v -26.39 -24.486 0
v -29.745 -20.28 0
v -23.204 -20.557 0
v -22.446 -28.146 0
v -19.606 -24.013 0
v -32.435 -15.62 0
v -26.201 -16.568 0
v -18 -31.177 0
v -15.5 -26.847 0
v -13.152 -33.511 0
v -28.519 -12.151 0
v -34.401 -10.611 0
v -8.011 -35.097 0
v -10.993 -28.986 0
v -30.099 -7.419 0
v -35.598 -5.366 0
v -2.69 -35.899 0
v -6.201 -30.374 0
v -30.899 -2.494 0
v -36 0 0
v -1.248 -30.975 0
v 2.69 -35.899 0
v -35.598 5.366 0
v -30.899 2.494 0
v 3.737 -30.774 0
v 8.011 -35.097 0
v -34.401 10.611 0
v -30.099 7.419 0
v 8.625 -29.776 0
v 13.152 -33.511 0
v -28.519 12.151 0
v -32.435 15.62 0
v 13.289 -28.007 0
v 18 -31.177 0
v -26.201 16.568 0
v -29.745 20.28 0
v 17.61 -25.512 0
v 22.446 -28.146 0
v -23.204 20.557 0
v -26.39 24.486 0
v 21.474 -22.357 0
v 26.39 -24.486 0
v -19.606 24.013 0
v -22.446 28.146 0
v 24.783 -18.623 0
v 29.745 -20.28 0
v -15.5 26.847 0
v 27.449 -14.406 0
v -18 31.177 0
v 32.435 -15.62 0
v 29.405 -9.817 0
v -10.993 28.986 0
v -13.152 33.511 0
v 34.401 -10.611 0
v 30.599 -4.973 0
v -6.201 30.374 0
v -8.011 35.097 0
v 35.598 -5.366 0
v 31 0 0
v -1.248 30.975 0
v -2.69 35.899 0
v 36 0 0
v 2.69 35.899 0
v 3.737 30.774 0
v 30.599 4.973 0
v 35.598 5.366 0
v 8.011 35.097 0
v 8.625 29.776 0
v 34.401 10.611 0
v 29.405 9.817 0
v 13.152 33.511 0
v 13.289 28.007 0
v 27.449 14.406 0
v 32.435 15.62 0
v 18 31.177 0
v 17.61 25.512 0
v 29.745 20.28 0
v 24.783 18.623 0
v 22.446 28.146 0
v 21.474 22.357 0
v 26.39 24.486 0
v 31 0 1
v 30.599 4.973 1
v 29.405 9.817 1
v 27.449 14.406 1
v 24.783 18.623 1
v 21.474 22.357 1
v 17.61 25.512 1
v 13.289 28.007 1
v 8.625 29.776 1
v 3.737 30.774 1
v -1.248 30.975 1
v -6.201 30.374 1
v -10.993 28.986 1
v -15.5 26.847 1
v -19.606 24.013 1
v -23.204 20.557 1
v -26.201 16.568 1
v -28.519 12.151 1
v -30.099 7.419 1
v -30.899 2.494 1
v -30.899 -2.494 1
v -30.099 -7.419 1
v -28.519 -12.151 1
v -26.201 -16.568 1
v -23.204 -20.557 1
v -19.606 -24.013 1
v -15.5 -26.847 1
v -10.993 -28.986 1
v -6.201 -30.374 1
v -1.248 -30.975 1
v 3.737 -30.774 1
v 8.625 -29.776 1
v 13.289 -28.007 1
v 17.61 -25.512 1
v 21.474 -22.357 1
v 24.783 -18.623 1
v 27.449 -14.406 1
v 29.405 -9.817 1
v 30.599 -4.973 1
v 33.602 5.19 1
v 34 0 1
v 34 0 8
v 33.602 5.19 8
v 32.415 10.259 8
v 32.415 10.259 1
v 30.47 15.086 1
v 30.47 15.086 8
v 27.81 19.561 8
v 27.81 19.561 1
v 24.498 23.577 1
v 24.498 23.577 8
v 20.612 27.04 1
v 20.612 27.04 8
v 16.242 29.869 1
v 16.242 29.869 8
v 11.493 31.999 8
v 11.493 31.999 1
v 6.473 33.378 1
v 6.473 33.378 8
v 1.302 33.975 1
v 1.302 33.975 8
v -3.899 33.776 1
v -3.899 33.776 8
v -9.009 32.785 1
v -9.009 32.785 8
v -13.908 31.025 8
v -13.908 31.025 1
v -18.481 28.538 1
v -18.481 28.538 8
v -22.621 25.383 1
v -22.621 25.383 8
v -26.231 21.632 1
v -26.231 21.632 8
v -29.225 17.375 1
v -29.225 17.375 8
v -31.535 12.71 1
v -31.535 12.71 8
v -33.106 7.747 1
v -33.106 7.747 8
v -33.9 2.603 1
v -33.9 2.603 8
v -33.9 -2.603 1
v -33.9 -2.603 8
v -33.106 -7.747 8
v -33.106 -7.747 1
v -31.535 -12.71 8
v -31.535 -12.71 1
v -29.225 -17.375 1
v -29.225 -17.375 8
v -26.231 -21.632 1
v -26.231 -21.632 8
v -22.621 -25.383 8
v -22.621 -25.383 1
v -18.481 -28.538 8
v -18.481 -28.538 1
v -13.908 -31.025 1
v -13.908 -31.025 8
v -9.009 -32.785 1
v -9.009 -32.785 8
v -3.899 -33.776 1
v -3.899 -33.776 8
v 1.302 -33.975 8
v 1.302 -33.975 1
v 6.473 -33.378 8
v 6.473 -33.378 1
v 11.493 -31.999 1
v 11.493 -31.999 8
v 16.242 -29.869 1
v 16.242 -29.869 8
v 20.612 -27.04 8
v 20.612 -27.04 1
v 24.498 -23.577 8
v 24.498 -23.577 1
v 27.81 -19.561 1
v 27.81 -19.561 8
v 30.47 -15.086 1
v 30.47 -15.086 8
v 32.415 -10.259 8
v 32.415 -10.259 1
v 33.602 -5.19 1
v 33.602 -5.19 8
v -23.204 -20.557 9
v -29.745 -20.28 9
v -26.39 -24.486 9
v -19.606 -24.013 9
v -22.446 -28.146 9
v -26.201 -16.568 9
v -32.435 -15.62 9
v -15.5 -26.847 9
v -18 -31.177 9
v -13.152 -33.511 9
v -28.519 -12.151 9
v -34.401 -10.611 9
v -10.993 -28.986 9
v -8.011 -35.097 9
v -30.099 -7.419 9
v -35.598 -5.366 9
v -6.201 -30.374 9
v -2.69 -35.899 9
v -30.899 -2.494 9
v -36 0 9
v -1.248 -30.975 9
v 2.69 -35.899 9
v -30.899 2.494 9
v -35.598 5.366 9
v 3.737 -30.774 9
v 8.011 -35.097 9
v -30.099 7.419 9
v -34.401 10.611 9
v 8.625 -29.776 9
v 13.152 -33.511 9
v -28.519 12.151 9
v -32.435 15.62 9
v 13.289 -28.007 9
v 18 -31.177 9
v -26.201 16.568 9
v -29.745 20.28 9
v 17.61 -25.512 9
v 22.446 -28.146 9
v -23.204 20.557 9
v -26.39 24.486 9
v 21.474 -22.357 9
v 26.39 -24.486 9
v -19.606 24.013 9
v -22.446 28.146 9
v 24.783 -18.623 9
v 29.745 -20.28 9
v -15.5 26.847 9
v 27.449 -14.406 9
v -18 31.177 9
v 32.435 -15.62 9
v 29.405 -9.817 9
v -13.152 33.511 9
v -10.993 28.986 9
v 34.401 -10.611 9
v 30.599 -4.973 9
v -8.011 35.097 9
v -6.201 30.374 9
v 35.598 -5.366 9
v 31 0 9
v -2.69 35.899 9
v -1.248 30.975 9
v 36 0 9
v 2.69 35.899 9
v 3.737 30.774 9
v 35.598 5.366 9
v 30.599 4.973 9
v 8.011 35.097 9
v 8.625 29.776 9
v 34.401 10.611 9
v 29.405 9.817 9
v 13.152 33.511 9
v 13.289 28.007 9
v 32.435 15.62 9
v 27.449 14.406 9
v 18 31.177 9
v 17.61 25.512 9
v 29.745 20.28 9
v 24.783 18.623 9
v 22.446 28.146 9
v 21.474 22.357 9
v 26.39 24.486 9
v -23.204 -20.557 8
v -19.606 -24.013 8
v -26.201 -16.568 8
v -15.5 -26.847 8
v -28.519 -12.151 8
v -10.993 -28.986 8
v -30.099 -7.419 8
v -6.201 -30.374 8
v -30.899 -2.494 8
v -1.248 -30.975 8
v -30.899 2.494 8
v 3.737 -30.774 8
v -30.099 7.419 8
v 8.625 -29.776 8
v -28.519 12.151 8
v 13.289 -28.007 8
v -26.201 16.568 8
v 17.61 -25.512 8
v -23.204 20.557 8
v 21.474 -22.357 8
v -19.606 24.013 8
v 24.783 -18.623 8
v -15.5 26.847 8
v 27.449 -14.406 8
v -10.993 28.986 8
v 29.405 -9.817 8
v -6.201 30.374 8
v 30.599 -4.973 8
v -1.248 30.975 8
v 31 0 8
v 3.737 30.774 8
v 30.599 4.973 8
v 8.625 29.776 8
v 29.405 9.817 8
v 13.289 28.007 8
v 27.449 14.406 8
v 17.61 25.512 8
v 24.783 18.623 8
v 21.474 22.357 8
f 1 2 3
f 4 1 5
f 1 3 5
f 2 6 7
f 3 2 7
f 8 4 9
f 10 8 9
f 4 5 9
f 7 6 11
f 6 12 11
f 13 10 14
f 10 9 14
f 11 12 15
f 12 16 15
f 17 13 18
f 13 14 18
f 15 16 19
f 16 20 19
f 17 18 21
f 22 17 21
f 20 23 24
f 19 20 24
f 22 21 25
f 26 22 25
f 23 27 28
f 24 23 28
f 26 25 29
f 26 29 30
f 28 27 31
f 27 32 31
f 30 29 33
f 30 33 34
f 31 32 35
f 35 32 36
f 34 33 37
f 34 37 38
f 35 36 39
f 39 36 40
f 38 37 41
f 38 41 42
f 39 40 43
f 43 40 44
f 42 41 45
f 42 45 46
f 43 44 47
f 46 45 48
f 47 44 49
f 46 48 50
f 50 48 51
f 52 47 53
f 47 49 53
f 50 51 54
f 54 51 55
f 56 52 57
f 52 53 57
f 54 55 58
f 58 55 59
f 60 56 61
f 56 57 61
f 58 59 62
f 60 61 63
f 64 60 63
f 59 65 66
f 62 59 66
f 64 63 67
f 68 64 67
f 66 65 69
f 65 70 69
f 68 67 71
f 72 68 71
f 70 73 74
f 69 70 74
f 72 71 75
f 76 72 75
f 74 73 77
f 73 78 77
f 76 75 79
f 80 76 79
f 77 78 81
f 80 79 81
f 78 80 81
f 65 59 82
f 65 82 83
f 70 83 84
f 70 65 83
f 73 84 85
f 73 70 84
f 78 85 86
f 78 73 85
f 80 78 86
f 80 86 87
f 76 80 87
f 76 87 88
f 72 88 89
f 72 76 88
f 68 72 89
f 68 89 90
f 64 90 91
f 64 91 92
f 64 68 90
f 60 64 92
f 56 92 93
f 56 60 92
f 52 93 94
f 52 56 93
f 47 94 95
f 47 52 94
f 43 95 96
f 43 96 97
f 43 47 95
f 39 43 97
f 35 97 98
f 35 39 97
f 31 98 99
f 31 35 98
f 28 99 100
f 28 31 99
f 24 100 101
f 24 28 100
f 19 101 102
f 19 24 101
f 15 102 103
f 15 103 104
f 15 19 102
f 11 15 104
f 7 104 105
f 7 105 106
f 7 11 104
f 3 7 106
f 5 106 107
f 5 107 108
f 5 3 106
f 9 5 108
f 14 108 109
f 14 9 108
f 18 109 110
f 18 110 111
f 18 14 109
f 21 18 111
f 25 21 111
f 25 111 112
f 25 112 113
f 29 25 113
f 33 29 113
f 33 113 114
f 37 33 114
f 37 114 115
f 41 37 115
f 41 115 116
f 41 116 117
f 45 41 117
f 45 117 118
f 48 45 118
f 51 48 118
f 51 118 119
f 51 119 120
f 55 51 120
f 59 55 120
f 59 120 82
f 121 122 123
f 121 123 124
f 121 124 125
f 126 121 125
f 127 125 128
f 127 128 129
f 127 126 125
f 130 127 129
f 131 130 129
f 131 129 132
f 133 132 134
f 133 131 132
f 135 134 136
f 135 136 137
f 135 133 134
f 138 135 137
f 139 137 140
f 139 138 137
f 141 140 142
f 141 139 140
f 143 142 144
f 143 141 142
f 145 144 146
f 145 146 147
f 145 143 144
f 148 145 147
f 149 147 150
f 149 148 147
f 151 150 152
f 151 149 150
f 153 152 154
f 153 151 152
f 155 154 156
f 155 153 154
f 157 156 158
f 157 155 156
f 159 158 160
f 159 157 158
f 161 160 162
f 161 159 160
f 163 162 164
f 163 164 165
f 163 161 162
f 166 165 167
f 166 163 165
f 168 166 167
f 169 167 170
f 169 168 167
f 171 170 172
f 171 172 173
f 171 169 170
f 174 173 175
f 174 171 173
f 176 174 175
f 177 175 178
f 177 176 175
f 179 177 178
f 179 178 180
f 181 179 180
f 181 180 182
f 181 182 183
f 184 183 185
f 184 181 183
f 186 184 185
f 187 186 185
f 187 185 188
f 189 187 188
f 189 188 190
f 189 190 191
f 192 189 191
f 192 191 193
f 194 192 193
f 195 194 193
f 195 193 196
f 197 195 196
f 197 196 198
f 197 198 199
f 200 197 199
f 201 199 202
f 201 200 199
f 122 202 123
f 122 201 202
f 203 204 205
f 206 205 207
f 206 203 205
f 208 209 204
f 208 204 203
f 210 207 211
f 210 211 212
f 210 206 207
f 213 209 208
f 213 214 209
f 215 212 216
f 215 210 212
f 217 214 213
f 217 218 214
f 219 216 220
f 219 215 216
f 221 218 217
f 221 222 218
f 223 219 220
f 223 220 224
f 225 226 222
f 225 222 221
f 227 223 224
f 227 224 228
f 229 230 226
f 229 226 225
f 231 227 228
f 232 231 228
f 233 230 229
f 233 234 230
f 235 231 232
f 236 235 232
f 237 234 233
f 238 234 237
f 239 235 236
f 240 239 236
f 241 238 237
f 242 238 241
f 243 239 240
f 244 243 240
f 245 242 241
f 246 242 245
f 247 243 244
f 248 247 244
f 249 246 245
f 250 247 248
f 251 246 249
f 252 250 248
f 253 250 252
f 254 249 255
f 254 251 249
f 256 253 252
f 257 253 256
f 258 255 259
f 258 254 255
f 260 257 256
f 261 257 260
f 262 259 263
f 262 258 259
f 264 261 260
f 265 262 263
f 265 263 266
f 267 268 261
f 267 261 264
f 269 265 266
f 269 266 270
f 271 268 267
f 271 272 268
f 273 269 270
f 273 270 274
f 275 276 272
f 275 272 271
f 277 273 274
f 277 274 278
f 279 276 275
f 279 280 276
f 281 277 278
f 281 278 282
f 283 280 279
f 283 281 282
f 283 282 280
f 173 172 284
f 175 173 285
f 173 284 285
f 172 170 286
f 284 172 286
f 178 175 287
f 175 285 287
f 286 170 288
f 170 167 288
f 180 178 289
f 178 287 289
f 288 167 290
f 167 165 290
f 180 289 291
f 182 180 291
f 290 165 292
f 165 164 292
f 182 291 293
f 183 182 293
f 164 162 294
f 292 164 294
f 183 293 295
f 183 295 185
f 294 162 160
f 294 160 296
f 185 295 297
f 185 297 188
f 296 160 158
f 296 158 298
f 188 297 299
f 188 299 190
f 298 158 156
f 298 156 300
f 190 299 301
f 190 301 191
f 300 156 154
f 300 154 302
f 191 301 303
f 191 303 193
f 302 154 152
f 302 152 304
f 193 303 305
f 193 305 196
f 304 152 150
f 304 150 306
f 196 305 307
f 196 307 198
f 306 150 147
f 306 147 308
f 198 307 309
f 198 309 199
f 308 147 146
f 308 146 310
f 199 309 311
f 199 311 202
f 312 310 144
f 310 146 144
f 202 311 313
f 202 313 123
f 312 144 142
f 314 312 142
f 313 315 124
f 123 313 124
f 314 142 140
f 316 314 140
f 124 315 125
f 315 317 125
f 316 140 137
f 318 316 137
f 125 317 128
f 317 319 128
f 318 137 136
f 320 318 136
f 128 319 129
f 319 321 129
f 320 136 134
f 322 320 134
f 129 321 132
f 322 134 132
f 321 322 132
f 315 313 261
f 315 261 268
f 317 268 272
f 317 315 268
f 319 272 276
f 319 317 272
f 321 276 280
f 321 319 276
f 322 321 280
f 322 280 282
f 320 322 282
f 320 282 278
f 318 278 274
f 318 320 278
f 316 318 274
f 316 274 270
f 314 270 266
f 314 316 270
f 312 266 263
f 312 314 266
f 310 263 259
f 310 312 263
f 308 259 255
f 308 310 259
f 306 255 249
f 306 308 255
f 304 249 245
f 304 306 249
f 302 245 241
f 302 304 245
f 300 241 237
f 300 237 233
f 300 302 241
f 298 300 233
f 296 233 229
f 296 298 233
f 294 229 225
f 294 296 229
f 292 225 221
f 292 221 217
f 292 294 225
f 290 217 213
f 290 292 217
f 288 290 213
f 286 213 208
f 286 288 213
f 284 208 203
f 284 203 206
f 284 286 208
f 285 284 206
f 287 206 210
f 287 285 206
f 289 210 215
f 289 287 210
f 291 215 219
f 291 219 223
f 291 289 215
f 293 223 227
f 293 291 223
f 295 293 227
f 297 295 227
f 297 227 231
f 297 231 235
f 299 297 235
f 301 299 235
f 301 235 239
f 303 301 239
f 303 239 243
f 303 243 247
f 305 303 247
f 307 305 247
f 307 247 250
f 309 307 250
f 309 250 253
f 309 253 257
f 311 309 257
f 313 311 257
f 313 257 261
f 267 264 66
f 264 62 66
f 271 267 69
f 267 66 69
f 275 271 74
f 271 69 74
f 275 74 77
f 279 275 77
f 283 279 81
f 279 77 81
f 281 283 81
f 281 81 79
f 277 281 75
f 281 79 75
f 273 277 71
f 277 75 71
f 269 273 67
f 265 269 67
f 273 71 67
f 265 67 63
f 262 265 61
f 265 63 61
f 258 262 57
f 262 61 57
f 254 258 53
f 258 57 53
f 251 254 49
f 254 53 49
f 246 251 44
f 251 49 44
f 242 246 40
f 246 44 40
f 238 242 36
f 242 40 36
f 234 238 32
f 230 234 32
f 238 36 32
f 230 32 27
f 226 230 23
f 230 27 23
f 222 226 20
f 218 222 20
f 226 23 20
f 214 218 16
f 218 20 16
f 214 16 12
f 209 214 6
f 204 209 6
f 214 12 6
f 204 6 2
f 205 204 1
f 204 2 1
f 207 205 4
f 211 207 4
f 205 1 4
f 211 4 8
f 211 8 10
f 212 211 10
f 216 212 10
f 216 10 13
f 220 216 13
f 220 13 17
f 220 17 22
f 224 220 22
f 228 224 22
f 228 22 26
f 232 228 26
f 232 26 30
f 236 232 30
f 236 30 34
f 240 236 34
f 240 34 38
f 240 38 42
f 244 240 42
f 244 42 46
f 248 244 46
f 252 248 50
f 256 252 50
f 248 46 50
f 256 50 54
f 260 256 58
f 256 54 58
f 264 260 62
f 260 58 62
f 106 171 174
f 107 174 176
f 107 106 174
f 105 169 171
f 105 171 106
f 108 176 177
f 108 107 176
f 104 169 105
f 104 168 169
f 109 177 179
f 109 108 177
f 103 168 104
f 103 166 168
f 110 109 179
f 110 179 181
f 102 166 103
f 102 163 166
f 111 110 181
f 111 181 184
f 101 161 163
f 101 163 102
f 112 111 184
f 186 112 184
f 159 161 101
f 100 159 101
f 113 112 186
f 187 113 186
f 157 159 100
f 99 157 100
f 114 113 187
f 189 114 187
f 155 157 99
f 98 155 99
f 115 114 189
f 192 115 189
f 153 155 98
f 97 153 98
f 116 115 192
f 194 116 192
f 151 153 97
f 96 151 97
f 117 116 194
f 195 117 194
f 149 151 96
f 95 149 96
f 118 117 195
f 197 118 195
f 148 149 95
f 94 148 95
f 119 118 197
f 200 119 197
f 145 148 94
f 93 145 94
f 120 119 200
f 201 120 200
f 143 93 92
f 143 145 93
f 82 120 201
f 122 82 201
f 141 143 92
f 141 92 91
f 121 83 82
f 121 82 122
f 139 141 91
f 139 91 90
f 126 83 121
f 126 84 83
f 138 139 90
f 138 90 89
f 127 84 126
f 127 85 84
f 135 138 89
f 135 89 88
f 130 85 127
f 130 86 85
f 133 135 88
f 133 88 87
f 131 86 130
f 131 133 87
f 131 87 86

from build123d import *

# Parameters (mm, degrees)
SKETCH1_R           = 36
SKETCH1_R_2         = 31
BOSS_EXTRUDE1_DEPTH = 1
SKETCH2_R           = 36
SKETCH2_R_2         = 34
BOSS_EXTRUDE2_DEPTH = 7
SKETCH3_R           = 36
SKETCH3_R_2         = 31
BOSS_EXTRUDE3_DEPTH = 1


with BuildPart() as part:
    # Sketch1 → Boss-Extrude1 (new body)
    with BuildSketch(Plane.XY):
        Circle(SKETCH1_R)
        Circle(SKETCH1_R_2, mode=Mode.SUBTRACT)
    extrude(amount=BOSS_EXTRUDE1_DEPTH)

    # Sketch2 → Boss-Extrude2 (add)
    with BuildSketch(Plane.XY.offset(1)):
        Circle(SKETCH2_R)
        Circle(SKETCH2_R_2, mode=Mode.SUBTRACT)
    extrude(amount=BOSS_EXTRUDE2_DEPTH)

    # Sketch3 → Boss-Extrude3 (add)
    with BuildSketch(Plane.XY.offset(8)):
        Circle(SKETCH3_R)
        Circle(SKETCH3_R_2, mode=Mode.SUBTRACT)
    extrude(amount=BOSS_EXTRUDE3_DEPTH)


solid = part.part
